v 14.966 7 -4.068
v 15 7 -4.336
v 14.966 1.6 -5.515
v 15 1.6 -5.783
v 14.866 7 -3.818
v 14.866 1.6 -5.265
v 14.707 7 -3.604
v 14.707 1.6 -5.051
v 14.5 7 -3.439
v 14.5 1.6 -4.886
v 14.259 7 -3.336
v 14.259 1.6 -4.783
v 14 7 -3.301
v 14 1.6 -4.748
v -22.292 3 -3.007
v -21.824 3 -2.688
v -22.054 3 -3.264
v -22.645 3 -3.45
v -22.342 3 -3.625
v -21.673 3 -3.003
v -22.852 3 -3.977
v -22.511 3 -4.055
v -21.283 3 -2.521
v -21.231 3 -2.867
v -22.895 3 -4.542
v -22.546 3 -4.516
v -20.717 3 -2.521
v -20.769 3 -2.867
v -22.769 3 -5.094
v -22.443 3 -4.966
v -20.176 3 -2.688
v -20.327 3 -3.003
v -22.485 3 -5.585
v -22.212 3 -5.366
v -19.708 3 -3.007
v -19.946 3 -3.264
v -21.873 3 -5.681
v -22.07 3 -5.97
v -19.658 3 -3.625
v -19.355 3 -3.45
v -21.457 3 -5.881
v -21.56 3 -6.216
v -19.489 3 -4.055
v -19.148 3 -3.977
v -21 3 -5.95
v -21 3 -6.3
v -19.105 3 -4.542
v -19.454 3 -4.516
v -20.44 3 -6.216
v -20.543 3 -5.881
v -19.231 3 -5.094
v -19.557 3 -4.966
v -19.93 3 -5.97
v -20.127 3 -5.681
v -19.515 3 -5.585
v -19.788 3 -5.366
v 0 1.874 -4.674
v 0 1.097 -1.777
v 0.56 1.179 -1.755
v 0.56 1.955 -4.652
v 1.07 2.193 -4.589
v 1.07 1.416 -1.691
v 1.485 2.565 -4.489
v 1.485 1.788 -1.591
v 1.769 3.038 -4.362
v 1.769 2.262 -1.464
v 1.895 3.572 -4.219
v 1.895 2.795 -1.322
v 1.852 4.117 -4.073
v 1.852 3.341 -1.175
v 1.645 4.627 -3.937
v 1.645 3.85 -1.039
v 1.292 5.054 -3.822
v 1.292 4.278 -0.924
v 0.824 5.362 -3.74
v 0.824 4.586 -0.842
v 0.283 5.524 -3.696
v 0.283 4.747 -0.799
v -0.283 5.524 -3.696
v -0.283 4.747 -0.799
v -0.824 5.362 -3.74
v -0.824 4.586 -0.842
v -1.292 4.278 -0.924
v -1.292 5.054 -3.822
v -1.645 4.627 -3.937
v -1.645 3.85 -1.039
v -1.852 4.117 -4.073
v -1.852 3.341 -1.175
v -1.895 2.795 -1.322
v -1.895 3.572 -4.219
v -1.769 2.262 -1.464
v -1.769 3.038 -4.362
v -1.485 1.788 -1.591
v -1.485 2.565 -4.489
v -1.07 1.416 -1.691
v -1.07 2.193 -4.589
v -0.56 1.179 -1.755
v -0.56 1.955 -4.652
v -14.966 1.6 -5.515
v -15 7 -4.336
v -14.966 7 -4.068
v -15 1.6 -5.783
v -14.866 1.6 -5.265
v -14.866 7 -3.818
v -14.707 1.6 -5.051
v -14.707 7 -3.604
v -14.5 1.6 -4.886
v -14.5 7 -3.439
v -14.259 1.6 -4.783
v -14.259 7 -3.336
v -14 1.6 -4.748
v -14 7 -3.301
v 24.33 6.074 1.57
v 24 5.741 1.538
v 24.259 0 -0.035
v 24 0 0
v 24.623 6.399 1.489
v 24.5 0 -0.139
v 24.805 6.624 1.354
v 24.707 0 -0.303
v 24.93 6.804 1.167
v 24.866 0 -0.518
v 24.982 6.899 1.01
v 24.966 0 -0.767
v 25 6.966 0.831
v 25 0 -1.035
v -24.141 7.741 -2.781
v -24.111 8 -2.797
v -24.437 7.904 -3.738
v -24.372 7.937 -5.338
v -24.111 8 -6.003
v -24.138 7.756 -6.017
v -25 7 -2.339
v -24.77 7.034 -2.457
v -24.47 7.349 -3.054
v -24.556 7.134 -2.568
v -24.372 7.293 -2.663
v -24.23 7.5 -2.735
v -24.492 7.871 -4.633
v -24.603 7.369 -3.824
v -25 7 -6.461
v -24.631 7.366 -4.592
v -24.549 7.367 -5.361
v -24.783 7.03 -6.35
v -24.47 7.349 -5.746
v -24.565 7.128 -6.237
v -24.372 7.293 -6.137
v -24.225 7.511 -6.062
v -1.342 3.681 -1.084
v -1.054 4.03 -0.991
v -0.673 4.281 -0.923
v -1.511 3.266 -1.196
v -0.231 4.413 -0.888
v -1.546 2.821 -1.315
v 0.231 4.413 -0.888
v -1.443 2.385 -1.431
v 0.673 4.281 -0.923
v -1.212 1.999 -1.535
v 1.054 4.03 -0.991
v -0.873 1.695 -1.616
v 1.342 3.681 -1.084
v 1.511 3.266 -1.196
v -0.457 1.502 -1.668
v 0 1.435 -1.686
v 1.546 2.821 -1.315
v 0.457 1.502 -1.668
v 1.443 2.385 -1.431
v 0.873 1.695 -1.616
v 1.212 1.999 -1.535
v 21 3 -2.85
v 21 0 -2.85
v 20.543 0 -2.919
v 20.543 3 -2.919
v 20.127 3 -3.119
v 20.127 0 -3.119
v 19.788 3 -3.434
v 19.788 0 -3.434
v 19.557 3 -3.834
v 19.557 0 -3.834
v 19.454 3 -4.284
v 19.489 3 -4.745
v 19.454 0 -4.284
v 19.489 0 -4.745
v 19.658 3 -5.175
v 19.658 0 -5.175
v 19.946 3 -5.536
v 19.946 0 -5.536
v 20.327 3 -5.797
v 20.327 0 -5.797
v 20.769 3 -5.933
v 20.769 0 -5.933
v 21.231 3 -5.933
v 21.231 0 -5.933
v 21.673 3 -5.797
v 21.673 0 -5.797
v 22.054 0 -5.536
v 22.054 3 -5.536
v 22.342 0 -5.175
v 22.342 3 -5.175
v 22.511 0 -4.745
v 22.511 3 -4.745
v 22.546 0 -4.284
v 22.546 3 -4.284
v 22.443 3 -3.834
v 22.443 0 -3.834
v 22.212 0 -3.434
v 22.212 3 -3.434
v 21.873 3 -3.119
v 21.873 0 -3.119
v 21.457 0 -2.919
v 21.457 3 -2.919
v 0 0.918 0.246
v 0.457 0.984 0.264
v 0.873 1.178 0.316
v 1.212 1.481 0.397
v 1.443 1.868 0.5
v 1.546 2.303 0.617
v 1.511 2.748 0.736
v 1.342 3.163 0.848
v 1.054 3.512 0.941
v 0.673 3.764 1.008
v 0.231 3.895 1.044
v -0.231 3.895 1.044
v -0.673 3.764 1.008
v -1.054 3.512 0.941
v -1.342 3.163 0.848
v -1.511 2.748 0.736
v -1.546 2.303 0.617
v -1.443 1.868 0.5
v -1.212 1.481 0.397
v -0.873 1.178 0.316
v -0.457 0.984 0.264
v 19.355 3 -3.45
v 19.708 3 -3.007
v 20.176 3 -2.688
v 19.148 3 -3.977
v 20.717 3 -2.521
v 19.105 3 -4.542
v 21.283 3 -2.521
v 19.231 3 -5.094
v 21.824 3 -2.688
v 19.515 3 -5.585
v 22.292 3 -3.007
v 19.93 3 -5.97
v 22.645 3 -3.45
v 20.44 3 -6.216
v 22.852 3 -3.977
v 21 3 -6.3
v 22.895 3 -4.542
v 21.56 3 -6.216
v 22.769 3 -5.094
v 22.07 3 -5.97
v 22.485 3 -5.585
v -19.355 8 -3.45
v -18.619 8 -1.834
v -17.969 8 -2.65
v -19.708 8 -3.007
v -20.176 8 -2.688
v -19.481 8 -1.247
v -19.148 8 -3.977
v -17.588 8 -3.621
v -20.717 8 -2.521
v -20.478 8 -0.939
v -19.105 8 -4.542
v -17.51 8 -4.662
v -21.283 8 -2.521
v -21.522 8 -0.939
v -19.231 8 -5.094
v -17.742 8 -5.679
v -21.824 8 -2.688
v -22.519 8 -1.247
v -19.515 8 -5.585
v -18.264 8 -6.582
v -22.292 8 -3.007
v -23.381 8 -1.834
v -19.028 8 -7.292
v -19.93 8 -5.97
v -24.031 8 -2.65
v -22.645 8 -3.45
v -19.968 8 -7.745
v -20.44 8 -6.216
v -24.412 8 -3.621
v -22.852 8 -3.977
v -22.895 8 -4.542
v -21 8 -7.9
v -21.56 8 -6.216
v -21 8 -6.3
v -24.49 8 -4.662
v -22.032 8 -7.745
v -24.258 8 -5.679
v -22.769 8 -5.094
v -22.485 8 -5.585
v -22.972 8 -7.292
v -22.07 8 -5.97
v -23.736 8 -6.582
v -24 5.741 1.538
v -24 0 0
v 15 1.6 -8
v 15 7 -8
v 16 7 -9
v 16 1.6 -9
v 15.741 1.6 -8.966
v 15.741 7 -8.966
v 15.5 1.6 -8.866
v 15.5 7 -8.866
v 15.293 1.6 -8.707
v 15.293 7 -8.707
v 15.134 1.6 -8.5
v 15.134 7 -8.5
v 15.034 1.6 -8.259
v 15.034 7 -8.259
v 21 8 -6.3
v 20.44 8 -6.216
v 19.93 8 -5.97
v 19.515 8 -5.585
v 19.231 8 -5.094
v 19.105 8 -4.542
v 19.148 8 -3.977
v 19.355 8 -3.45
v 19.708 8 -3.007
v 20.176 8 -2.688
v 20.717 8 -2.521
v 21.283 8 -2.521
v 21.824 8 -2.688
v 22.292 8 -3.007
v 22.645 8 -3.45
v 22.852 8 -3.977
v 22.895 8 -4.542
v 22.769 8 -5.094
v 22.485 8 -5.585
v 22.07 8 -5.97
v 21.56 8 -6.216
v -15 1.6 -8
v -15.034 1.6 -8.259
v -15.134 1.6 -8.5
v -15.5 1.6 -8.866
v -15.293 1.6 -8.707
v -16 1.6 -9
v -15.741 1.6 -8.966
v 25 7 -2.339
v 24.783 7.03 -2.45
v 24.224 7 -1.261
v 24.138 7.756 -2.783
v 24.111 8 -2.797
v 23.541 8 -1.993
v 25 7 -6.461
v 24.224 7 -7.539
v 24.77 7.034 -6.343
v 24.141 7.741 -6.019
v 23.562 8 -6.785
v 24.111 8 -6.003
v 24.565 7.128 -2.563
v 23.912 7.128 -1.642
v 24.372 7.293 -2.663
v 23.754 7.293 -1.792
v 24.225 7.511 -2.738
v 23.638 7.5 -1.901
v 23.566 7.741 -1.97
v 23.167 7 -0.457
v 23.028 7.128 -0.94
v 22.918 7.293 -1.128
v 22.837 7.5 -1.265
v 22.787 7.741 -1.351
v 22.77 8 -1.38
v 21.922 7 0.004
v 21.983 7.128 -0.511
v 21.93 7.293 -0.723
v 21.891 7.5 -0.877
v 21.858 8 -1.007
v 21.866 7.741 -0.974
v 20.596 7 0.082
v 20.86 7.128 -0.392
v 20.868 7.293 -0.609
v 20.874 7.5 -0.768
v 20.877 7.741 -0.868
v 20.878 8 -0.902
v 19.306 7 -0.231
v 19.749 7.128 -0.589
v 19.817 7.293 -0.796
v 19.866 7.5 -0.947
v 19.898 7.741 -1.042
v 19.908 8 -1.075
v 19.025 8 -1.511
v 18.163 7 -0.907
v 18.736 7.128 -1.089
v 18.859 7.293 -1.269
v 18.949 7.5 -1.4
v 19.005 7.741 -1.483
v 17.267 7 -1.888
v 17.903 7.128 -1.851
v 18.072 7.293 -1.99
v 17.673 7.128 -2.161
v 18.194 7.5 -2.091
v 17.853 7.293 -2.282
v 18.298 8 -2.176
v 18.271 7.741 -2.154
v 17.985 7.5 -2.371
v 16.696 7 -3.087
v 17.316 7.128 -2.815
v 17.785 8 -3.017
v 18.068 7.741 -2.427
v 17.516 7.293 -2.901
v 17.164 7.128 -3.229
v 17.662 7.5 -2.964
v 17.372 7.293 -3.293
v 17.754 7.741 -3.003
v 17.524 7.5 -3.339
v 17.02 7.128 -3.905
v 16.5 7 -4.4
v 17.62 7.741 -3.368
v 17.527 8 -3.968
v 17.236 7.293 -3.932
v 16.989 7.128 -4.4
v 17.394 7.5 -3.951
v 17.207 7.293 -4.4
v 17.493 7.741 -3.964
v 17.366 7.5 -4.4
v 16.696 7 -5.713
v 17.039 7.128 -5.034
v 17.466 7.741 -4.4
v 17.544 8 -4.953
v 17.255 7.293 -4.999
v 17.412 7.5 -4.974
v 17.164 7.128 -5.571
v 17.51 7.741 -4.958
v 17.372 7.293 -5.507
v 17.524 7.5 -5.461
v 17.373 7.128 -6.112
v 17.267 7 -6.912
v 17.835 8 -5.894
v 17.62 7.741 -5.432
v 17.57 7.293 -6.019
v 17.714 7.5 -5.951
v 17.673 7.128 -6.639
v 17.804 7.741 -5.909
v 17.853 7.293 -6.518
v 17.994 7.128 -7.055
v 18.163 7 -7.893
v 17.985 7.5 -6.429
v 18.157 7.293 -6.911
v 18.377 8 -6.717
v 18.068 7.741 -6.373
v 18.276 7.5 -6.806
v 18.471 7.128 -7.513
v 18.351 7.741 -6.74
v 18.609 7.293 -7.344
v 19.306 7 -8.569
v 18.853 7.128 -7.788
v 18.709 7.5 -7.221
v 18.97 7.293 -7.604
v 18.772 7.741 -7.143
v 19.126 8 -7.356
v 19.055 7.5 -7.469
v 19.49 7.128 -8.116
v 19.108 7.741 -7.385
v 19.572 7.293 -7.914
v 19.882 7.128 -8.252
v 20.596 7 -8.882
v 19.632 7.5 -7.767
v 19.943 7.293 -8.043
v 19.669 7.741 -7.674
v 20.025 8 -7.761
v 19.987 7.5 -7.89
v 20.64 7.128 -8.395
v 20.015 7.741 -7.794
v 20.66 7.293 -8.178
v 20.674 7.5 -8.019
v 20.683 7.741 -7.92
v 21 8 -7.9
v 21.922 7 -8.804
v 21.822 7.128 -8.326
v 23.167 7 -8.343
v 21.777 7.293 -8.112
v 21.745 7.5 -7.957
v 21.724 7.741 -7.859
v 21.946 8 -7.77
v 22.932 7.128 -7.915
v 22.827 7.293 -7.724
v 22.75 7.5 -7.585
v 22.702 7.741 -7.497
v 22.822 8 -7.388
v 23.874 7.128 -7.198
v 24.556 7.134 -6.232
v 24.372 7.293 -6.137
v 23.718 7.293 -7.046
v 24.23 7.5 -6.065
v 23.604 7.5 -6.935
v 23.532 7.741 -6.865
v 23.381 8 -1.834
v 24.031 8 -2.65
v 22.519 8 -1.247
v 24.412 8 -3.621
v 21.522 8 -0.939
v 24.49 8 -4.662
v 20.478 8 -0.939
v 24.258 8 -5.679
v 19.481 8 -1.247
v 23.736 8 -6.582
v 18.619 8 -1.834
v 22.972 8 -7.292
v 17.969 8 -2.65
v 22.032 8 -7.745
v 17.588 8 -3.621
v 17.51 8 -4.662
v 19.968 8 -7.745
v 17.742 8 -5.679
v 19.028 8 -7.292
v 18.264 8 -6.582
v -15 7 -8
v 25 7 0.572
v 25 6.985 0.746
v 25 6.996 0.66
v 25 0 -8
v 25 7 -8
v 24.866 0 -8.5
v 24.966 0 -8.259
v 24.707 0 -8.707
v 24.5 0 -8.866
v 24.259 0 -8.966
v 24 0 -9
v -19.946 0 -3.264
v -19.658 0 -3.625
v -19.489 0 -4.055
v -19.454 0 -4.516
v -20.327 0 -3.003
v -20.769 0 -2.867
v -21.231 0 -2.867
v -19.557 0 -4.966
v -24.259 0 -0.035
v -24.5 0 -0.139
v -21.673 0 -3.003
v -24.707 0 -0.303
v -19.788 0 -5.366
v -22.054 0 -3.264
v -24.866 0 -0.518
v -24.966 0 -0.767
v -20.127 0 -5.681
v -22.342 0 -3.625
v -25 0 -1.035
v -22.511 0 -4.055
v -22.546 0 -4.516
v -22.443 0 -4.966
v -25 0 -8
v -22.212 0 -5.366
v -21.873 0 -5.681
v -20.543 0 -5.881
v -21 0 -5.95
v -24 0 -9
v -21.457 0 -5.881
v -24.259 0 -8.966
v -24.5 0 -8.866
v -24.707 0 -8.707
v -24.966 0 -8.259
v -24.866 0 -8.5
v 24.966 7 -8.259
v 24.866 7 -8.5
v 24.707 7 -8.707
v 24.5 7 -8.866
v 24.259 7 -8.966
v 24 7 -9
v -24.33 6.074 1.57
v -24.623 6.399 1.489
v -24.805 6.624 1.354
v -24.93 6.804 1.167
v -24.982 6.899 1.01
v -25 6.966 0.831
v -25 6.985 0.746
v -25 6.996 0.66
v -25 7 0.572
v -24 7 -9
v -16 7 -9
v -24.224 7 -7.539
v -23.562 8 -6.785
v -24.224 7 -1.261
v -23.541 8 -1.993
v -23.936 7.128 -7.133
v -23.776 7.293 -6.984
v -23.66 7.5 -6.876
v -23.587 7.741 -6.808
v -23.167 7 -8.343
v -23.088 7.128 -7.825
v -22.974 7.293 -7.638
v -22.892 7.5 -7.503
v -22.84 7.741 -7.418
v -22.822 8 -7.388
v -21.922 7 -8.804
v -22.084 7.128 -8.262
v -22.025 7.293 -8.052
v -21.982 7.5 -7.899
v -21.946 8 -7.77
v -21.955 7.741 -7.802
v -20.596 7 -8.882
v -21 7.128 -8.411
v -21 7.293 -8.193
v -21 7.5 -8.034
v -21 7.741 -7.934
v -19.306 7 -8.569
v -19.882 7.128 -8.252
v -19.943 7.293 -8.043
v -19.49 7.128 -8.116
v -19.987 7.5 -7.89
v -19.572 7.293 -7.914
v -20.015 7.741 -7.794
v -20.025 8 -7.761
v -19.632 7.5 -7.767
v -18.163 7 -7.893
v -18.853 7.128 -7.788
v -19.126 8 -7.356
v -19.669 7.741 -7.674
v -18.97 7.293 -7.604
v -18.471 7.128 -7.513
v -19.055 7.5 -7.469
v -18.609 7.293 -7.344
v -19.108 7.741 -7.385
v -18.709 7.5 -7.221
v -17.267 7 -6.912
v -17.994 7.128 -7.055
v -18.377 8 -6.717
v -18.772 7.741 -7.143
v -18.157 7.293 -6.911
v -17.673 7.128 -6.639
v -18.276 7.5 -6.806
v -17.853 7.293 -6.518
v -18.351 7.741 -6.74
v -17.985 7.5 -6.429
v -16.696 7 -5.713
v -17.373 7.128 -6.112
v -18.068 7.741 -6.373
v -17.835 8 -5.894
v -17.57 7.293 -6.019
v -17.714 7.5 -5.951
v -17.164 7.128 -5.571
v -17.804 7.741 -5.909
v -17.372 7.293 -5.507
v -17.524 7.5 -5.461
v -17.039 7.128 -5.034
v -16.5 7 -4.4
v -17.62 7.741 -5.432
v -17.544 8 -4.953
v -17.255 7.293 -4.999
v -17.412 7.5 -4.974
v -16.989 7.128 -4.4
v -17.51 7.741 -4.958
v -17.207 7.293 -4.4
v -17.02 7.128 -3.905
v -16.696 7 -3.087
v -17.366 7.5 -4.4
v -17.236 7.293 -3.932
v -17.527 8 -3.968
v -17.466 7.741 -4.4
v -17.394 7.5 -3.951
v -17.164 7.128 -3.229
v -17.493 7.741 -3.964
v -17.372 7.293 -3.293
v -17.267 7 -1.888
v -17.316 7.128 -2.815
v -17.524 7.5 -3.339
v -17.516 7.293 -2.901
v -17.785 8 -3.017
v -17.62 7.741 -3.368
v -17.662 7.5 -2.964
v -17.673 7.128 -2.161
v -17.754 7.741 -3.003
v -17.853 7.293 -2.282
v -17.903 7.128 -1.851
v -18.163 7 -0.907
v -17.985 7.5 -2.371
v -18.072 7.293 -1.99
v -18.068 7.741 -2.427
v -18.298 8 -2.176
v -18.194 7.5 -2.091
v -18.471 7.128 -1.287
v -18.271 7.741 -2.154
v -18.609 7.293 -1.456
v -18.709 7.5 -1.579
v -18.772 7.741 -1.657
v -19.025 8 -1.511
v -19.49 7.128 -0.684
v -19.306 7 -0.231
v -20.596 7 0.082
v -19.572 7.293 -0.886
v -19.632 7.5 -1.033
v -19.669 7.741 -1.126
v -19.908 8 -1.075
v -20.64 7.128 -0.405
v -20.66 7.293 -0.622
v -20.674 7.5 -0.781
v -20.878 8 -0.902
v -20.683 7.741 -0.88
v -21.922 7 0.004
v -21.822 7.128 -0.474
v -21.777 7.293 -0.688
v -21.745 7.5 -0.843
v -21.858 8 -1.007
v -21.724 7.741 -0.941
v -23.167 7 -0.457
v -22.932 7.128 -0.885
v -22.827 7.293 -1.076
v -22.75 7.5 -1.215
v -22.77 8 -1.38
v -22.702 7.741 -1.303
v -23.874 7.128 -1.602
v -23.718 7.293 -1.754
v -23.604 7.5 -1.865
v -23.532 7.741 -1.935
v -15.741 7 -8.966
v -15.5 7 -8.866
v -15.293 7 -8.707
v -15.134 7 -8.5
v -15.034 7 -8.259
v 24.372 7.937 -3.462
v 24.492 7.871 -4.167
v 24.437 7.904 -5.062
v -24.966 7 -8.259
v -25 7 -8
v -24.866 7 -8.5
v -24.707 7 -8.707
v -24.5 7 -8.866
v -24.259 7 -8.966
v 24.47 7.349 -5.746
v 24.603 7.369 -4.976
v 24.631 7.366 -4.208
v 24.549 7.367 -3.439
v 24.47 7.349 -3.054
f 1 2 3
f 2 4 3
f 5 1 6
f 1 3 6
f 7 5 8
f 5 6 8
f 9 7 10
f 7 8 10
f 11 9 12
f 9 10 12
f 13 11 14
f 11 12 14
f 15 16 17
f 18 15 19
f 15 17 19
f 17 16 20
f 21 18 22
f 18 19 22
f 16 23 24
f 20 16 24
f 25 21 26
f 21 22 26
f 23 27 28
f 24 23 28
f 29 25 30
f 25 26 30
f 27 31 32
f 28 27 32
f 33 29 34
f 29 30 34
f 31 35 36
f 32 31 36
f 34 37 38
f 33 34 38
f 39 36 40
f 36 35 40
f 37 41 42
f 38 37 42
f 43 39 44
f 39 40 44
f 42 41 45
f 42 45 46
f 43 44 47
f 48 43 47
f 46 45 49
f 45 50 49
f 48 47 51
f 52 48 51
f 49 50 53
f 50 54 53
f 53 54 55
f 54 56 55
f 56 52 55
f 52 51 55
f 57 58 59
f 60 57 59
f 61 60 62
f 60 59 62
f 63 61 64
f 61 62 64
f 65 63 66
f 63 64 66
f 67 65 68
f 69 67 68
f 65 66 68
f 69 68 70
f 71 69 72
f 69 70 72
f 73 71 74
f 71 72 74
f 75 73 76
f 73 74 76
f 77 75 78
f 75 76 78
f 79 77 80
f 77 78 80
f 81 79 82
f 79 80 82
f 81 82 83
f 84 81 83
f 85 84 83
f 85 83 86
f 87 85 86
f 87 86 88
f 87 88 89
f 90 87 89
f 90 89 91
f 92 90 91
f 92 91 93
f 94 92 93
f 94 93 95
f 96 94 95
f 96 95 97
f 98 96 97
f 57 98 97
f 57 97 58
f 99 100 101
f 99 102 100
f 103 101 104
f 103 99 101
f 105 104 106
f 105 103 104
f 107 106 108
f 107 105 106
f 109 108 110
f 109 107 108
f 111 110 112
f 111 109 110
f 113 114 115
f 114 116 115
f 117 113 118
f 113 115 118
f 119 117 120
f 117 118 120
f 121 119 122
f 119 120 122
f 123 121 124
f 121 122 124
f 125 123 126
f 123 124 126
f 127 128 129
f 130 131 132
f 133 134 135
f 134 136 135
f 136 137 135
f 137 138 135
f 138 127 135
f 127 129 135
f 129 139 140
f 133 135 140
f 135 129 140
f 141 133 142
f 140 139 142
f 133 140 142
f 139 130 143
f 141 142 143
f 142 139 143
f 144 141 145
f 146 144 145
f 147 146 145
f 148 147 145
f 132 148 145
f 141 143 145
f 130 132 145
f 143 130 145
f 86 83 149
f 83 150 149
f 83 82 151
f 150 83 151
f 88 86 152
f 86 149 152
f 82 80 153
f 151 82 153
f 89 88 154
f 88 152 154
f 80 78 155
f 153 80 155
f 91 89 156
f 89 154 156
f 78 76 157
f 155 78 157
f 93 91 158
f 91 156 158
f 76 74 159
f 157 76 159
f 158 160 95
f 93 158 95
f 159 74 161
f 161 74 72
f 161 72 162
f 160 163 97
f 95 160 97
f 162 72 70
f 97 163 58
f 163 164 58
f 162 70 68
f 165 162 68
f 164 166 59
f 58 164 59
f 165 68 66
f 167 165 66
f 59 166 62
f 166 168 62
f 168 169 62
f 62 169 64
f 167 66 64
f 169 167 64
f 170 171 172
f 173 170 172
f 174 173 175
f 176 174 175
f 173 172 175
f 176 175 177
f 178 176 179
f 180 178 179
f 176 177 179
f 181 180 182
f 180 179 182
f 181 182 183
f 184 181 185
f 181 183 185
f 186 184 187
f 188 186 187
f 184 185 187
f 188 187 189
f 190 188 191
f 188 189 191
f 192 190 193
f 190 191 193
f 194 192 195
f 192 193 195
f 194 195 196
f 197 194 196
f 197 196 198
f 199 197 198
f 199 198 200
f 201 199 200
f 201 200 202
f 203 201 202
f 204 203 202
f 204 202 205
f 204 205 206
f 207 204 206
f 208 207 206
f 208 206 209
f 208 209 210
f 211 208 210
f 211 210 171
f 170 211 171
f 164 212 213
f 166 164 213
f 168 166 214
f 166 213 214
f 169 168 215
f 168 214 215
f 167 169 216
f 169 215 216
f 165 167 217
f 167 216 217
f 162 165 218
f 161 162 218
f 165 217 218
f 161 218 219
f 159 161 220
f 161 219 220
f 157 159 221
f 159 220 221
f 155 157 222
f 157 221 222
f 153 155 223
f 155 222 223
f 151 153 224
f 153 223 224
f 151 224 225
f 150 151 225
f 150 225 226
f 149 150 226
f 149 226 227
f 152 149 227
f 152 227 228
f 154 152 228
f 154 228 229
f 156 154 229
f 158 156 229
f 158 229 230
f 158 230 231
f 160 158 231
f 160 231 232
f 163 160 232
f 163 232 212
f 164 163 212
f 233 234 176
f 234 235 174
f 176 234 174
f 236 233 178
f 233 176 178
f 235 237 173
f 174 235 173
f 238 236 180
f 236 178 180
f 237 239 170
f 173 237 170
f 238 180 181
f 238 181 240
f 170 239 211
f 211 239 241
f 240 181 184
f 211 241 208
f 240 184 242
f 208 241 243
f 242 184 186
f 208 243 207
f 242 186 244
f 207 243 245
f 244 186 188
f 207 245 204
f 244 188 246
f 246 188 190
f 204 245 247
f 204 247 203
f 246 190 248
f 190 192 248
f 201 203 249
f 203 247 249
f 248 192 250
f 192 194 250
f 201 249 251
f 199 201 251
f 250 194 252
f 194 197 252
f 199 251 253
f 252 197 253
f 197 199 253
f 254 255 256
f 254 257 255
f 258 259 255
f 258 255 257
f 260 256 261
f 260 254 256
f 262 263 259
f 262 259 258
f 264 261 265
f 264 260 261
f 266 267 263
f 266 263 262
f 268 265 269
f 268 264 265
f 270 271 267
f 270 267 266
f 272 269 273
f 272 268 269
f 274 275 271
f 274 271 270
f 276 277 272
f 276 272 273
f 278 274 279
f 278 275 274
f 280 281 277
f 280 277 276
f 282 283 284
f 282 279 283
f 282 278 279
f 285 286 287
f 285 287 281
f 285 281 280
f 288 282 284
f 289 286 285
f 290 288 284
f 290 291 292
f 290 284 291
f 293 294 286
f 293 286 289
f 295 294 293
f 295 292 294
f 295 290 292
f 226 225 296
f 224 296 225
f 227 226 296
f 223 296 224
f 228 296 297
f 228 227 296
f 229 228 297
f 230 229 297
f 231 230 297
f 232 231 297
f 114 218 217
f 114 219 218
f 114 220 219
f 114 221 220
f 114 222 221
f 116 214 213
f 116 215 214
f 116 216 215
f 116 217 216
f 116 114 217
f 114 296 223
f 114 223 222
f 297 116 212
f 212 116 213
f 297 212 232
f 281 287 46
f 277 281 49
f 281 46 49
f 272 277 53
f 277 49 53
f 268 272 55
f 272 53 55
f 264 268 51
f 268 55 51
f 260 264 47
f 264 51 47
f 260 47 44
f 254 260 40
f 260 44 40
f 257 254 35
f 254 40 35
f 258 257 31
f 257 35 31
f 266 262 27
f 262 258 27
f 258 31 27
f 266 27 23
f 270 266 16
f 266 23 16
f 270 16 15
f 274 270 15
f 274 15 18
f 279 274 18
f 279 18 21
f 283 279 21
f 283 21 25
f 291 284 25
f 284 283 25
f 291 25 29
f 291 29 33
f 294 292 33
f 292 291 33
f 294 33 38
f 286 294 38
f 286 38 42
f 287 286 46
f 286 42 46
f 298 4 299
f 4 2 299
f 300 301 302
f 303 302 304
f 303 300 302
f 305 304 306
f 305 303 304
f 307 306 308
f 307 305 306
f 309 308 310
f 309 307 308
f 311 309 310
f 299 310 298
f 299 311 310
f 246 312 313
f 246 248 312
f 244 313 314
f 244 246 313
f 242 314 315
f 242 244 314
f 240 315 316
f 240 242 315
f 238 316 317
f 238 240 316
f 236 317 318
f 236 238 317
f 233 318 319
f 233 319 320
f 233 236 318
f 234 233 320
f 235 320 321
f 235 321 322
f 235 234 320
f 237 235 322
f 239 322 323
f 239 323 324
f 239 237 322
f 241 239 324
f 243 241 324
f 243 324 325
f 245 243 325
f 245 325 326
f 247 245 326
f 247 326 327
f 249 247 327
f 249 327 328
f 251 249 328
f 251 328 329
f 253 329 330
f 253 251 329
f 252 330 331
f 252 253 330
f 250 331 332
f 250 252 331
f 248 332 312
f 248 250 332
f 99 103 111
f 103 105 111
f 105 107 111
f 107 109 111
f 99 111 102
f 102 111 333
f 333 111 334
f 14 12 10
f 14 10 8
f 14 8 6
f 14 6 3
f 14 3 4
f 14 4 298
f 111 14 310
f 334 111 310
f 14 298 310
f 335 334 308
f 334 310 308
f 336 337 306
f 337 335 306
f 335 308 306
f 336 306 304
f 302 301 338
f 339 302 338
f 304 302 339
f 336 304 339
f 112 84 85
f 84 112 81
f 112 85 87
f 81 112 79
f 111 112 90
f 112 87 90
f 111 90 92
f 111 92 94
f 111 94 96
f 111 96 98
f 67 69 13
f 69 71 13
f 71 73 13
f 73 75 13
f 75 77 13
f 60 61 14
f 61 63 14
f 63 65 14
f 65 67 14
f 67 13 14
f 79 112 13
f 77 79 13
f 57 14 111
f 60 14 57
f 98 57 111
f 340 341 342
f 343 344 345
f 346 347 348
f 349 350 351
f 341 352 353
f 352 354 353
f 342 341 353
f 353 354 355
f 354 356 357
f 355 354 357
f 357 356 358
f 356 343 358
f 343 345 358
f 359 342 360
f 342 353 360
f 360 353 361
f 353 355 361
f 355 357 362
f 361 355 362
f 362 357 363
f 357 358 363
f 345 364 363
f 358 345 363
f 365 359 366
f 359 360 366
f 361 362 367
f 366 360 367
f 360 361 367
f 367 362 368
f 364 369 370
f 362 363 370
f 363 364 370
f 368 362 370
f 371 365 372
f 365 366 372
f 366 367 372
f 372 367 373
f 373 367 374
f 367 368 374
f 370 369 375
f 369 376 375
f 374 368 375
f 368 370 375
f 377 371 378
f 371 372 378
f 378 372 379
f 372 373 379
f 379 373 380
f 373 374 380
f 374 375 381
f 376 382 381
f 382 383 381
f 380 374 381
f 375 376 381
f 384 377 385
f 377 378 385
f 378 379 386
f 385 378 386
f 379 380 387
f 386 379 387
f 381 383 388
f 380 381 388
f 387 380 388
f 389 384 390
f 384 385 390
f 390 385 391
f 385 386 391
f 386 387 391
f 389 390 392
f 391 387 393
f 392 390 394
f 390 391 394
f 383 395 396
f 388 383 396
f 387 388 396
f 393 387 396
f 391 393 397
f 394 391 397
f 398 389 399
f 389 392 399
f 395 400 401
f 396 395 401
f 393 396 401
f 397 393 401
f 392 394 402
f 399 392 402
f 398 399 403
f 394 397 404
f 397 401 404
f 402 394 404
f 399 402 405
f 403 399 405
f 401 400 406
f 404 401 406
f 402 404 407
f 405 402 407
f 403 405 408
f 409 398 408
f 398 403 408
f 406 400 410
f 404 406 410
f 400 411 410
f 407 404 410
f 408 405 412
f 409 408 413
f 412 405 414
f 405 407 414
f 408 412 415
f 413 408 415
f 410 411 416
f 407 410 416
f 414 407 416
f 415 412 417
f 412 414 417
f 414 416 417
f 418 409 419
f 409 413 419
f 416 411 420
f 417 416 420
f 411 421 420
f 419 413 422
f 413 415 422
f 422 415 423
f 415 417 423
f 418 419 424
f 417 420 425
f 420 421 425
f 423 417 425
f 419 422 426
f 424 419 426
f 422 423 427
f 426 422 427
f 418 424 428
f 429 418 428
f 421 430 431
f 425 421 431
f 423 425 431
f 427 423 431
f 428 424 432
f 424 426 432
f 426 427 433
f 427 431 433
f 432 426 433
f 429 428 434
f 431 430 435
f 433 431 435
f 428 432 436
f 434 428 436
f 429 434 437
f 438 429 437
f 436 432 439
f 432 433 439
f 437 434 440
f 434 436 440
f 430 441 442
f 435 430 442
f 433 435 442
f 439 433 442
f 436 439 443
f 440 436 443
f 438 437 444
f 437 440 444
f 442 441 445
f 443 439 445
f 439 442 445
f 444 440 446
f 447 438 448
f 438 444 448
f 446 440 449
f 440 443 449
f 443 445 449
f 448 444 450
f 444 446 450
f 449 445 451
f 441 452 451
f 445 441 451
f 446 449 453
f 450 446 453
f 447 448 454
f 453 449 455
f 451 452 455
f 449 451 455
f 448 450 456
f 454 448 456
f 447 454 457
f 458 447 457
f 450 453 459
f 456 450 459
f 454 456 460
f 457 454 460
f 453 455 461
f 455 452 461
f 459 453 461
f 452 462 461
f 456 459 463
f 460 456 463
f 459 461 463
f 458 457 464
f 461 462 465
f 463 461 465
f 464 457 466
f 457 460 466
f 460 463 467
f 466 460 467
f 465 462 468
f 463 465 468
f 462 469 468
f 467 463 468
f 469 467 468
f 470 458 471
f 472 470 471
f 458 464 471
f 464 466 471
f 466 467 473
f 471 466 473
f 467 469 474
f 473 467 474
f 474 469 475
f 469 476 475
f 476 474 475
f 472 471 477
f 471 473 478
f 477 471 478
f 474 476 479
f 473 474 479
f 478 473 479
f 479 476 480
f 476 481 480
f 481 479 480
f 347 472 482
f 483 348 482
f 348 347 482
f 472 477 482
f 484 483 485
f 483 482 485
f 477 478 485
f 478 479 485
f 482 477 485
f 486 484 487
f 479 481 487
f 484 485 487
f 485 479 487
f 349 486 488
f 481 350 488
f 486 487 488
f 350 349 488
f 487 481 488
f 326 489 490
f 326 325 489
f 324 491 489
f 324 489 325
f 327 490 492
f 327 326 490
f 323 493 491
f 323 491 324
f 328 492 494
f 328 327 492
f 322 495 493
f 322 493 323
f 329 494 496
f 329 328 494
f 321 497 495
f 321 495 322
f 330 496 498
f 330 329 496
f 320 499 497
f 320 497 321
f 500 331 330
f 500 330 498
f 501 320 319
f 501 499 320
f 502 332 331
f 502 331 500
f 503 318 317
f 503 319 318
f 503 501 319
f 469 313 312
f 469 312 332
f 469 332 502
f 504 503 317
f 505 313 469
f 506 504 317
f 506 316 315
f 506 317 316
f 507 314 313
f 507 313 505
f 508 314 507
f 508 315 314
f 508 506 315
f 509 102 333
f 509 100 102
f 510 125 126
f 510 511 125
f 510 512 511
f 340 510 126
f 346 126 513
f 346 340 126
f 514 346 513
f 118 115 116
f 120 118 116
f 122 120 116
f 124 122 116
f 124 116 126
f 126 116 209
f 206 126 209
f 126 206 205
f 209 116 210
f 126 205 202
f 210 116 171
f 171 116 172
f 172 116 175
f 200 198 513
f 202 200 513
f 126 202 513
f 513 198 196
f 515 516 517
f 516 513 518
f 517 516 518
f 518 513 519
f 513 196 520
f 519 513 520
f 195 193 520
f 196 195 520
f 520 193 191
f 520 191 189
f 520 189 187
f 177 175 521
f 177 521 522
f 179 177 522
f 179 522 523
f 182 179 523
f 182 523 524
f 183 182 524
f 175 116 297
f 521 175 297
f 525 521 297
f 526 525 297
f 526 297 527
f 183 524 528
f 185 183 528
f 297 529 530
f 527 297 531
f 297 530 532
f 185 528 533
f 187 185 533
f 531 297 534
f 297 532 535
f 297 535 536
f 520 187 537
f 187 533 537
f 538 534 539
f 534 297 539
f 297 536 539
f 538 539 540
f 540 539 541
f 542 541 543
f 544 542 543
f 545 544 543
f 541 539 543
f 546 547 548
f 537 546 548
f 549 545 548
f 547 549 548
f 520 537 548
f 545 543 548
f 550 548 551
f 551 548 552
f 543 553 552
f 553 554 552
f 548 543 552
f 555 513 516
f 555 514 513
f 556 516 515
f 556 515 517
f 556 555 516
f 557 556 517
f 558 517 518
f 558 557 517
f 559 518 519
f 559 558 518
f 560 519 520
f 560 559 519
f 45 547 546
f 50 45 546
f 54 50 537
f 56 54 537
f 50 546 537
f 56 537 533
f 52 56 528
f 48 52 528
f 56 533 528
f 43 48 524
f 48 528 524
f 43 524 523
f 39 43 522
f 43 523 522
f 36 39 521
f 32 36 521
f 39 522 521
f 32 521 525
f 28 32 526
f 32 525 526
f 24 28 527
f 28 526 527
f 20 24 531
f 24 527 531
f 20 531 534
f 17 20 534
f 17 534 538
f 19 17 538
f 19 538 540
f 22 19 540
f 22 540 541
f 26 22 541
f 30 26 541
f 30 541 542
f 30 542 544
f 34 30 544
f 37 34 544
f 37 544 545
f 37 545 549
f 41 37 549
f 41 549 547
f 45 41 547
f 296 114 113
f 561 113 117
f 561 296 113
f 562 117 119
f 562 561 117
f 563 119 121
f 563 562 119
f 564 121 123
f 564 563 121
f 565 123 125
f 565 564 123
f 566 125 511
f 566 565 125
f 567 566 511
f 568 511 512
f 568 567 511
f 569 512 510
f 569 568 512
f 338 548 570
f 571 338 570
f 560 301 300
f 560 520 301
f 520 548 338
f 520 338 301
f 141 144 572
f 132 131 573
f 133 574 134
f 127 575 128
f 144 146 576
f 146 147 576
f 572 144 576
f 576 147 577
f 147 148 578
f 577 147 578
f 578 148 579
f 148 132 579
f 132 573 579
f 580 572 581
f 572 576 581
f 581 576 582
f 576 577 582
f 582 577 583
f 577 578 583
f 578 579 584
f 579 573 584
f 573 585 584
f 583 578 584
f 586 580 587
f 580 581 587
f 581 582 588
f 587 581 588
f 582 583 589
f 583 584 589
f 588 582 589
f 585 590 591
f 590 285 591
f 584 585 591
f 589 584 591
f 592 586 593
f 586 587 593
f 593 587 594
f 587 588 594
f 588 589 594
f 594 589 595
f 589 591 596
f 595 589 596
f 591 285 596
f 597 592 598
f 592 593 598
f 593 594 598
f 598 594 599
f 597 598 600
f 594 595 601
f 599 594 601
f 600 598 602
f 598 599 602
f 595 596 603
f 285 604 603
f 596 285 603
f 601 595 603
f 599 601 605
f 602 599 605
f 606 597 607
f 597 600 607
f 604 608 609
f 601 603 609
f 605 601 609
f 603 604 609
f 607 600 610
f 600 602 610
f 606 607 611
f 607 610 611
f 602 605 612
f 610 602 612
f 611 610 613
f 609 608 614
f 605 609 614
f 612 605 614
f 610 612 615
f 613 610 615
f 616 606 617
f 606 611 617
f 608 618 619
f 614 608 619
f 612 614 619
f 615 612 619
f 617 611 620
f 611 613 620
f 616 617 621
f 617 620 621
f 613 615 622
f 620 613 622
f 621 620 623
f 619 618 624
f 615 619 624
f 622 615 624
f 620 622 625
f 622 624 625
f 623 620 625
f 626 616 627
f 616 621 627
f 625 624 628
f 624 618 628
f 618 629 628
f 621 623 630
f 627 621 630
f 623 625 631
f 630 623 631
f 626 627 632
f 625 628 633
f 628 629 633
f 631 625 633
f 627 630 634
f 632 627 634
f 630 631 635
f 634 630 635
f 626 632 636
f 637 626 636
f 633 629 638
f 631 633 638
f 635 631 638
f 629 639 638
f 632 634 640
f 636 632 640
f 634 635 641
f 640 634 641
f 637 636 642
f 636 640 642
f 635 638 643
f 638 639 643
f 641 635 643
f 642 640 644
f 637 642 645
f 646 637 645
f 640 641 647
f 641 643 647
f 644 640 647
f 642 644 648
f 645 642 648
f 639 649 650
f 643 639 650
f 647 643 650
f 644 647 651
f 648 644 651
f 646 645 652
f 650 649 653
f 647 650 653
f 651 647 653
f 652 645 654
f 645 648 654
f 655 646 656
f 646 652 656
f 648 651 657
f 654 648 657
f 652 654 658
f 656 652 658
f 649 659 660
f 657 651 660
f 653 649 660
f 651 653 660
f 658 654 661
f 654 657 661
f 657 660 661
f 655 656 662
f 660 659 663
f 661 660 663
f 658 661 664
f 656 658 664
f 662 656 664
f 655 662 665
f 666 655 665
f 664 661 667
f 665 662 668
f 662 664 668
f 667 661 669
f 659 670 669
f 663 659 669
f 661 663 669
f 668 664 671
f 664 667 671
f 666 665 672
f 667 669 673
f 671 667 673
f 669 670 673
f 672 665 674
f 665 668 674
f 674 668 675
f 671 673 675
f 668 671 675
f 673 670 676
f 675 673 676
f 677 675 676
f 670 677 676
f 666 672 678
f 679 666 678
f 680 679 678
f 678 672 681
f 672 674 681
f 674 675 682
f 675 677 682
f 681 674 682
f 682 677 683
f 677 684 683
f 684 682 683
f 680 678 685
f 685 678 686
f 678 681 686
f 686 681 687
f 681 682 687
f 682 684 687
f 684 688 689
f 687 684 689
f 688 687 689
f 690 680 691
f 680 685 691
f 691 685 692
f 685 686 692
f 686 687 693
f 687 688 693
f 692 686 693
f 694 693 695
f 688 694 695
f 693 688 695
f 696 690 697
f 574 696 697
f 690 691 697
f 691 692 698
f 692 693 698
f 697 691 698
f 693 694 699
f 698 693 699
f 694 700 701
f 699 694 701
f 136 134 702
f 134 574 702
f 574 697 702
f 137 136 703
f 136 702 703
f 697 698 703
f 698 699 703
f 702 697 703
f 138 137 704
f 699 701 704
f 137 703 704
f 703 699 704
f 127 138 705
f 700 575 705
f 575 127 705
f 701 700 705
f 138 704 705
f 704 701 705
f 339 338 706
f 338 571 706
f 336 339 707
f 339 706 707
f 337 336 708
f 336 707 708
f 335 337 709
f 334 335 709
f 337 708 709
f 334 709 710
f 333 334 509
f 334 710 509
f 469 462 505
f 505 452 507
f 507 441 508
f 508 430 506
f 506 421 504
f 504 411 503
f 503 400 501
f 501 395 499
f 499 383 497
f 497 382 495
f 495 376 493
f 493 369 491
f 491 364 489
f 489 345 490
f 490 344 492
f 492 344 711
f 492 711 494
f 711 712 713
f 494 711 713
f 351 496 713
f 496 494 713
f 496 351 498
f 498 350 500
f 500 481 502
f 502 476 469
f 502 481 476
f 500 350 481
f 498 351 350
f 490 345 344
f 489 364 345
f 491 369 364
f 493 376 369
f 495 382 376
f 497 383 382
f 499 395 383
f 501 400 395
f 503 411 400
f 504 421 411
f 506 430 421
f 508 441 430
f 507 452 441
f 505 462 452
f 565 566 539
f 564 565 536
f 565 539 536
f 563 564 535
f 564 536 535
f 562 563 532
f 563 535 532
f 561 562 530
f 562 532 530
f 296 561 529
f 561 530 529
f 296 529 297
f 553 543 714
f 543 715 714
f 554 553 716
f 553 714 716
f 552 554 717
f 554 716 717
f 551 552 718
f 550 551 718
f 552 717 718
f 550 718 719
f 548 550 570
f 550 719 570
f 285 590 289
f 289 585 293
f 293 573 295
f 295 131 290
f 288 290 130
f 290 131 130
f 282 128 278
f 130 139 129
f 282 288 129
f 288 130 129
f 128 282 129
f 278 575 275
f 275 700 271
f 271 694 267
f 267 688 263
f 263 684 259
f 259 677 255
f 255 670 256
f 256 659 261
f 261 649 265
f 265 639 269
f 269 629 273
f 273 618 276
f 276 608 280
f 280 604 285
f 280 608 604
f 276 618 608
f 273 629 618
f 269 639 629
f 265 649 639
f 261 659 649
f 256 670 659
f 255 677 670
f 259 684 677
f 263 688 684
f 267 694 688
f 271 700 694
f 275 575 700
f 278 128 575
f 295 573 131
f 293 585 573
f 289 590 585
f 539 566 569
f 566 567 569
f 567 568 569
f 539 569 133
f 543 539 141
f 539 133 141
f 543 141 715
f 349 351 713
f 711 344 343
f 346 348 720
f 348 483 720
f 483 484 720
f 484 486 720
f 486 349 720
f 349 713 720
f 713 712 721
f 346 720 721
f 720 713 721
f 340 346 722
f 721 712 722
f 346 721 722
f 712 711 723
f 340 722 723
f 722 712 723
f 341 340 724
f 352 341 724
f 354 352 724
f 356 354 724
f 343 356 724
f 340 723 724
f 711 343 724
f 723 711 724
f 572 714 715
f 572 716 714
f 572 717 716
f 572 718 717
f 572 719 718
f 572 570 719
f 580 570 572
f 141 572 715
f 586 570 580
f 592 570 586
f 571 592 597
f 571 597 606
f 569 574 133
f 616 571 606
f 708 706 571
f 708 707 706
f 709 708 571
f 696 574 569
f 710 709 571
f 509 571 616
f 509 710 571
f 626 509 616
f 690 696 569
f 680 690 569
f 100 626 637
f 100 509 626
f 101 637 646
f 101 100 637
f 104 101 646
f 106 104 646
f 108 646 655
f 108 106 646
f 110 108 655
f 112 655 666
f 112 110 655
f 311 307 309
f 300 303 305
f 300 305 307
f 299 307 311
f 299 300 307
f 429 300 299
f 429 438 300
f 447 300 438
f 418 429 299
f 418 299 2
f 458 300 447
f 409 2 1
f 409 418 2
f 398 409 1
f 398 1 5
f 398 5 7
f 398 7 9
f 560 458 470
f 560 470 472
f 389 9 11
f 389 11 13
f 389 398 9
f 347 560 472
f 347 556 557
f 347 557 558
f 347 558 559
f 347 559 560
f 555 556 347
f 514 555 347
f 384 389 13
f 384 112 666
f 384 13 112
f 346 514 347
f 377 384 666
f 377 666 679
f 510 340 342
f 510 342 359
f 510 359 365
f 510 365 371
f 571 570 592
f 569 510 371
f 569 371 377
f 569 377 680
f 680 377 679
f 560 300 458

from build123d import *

# Parameters (mm, degrees)
BOSS_EXTRU_1_DEPTH      = 25
ESQUISSE2_R             = 1.55
ENL_V_MAT_EXTRU_1_DEPTH = 28.477263328
ENL_V_START             = -3
ESQUISSE3_R             = 1.9
ENL_V_MAT_EXTRU_2_DEPTH = 25.477263328
ESQUISSE4_R             = 3.5
ESQUISSE4_R_2           = 1.9
BOSS_EXTRU_2_DEPTH      = 8
ENL_V_MAT_EXTRU_3_DEPTH = 15
ESQUISSE7_R             = 1.55
ENL_V_MAT_EXTRU_4_DEPTH = 28.748873851
ENL_V_START_2           = -2
ESQUISSE8_R             = 1.9
ENL_V_MAT_EXTRU_5_DEPTH = 26.748873851
CONG_1_R                = 1
CONG_2_START            = -26
CONG_2_DEPTH            = 52


with BuildPart() as part:
    # Esquisse1 → Boss.-Extru.1 (new, symmetric)
    with BuildSketch(Plane(origin=(0, 0, 0), x_dir=(0, 0, -1), z_dir=(1, 0, 0))):
        Polygon((0, 0), (9, 0), (9, 7), (-1.875644347, 7), align=None)
    extrude(amount=BOSS_EXTRU_1_DEPTH, both=True)

    # Esquisse2 → Enlèv. mat.-Extru.1 (cut, through all)
    with BuildSketch(Plane.XZ):
        with Locations(Location((-21, -4.4, 0), (0, 0, 270))):
            Circle(ESQUISSE2_R)
        with Locations(Location((21, -4.4, 0), (0, 0, 90))):
            Circle(ESQUISSE2_R)
    extrude(amount=-ENL_V_MAT_EXTRU_1_DEPTH, mode=Mode.SUBTRACT)

    # Esquisse3 → Enlèv. mat.-Extru.2 (cut, through all)
    with BuildSketch(Plane.XZ.offset(ENL_V_START)):
        with Locations(Location((-21, -4.4, 0), (0, 0, 270))):
            Circle(ESQUISSE3_R)
        with Locations(Location((21, -4.4, 0), (0, 0, 270))):
            Circle(ESQUISSE3_R)
    extrude(amount=-ENL_V_MAT_EXTRU_2_DEPTH, mode=Mode.SUBTRACT)

    # Esquisse4 → Boss.-Extru.2 (add)
    # profile 1 of 2: a face of its own
    with BuildSketch(Plane(origin=(0, 0, 0), x_dir=(1, 0, 0), z_dir=(0, 1, 0))):
        with Locations(Location((-21, 4.4, 0), (0, 0, 90))):
            Circle(ESQUISSE4_R)
        with Locations(Location((-21, 4.4, 0), (0, 0, 90))):
            Circle(ESQUISSE4_R_2, mode=Mode.SUBTRACT)
    # profile 2 of 2: a face of its own
    with BuildSketch(Plane(origin=(0, 0, 0), x_dir=(1, 0, 0), z_dir=(0, 1, 0))):
        with Locations(Location((21, 4.4, 0), (0, 0, 90))):
            Circle(ESQUISSE4_R)
        with Locations(Location((21, 4.4, 0), (0, 0, 90))):
            Circle(ESQUISSE4_R_2, mode=Mode.SUBTRACT)
    extrude(amount=BOSS_EXTRU_2_DEPTH)

    # Esquisse6 → Enlèv. mat.-Extru.3 (cut, symmetric)
    with BuildSketch(Plane(origin=(0, 0, 0), x_dir=(0, 0, -1), z_dir=(1, 0, 0))):
        Polygon((3.300736555, 7), (4.747662194, 1.6), (9, 1.6), (9, 7), align=None)
    extrude(amount=ENL_V_MAT_EXTRU_3_DEPTH, both=True, mode=Mode.SUBTRACT)

    # Esquisse7 → Enlèv. mat.-Extru.4 (cut, through all)
    with BuildSketch(Plane(origin=(0, 0, 0), x_dir=(1, 0, 0), z_dir=(0, -0.25881904510252496, 0.9659258262890672))):
        with Locations(Location((0, 2.5, 0), (0, 0, 270))):
            Circle(ESQUISSE7_R)
    extrude(amount=-ENL_V_MAT_EXTRU_4_DEPTH, mode=Mode.SUBTRACT)

    # Esquisse8 → Enlèv. mat.-Extru.5 (cut, through all)
    with BuildSketch(Plane(origin=(0, 0, 0), x_dir=(1, 0, 0), z_dir=(0, -0.25881904510252496, 0.9659258262890672)).offset(ENL_V_START_2)):
        with Locations(Location((0, 2.5, 0), (0, 0, 270))):
            Circle(ESQUISSE8_R)
    extrude(amount=-ENL_V_MAT_EXTRU_5_DEPTH, mode=Mode.SUBTRACT)

    # Congé1
    cong_1_edges = [part.edges().sort_by_distance(p)[0] for p in [
        (25, 3.5, -9),
        (-21, 7, -0.9),
        (25, 3.5, 0.937822174),
        (21, 7, -0.9),
        (-25, 3.5, -9),
        (-25, 3.5, 0.937822174),
        (-15, 4.3, -9),
        (-15, 4.3, -4.024199375),
        (15, 4.3, -9),
        (15, 4.3, -4.024199375),
    ]]
    fillet(cong_1_edges, radius=CONG_1_R - 0.0001)  # a hair under: the kernel refuses the full size

    # Congé2: read off the stored shape, not the designer's step
    # Congé2 outline → Congé2 (cut)
    with BuildSketch(Plane.YZ.offset(CONG_2_START)):
        with BuildLine():
            Line((7, 1.875644347), (5.741180955, 1.5383448))
            ThreePointArc((5.741180955, 1.5383448), (6.608761429, 1.365772314), (7, 0.572418974))
            Line((7, 0.572418974), (7, 1.875644347))
        make_face()
    extrude(amount=CONG_2_DEPTH, mode=Mode.SUBTRACT)


solid = part.part
